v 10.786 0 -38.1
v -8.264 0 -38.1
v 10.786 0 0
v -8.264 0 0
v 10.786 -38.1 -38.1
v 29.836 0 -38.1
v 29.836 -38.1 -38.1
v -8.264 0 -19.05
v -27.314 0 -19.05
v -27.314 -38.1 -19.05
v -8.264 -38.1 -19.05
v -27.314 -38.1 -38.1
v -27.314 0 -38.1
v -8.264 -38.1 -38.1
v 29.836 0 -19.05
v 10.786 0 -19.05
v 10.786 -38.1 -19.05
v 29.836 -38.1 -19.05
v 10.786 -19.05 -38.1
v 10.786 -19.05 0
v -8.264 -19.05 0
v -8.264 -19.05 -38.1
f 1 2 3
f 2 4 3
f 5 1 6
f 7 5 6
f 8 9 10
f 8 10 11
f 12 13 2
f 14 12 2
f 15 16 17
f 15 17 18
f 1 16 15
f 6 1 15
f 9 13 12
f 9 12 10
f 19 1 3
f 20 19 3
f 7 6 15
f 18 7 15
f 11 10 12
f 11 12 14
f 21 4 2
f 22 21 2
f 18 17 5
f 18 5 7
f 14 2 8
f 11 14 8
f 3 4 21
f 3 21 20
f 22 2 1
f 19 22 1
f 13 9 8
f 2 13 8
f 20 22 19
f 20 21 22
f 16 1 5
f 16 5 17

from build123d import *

# Parameters (mm, degrees)
F0_W     = 19.05
F0_H     = 19.05
F1_DEPTH = 38.1
F2_DEPTH = 19.05


with BuildPart() as f1:
    # F0 (on Front) → F1 (new body)
    with BuildSketch(Plane.XZ):
        with Locations((-17.78868, -28.575)):
            Rectangle(F0_W, F0_H)
        with Locations((20.31132, -28.575)):
            Rectangle(F0_W, F0_H)
    extrude(amount=F1_DEPTH)


with BuildPart() as f2:
    # F0 (on Front) → F2 (new body)
    with BuildSketch(Plane.XZ):
        with Locations((1.26132, -28.575)):
            Rectangle(F0_W, F0_H)
        with Locations((1.26132, -9.525)):
            Rectangle(F0_W, F0_H)
    extrude(amount=F2_DEPTH)


solid = Compound([f1.part, f2.part])
